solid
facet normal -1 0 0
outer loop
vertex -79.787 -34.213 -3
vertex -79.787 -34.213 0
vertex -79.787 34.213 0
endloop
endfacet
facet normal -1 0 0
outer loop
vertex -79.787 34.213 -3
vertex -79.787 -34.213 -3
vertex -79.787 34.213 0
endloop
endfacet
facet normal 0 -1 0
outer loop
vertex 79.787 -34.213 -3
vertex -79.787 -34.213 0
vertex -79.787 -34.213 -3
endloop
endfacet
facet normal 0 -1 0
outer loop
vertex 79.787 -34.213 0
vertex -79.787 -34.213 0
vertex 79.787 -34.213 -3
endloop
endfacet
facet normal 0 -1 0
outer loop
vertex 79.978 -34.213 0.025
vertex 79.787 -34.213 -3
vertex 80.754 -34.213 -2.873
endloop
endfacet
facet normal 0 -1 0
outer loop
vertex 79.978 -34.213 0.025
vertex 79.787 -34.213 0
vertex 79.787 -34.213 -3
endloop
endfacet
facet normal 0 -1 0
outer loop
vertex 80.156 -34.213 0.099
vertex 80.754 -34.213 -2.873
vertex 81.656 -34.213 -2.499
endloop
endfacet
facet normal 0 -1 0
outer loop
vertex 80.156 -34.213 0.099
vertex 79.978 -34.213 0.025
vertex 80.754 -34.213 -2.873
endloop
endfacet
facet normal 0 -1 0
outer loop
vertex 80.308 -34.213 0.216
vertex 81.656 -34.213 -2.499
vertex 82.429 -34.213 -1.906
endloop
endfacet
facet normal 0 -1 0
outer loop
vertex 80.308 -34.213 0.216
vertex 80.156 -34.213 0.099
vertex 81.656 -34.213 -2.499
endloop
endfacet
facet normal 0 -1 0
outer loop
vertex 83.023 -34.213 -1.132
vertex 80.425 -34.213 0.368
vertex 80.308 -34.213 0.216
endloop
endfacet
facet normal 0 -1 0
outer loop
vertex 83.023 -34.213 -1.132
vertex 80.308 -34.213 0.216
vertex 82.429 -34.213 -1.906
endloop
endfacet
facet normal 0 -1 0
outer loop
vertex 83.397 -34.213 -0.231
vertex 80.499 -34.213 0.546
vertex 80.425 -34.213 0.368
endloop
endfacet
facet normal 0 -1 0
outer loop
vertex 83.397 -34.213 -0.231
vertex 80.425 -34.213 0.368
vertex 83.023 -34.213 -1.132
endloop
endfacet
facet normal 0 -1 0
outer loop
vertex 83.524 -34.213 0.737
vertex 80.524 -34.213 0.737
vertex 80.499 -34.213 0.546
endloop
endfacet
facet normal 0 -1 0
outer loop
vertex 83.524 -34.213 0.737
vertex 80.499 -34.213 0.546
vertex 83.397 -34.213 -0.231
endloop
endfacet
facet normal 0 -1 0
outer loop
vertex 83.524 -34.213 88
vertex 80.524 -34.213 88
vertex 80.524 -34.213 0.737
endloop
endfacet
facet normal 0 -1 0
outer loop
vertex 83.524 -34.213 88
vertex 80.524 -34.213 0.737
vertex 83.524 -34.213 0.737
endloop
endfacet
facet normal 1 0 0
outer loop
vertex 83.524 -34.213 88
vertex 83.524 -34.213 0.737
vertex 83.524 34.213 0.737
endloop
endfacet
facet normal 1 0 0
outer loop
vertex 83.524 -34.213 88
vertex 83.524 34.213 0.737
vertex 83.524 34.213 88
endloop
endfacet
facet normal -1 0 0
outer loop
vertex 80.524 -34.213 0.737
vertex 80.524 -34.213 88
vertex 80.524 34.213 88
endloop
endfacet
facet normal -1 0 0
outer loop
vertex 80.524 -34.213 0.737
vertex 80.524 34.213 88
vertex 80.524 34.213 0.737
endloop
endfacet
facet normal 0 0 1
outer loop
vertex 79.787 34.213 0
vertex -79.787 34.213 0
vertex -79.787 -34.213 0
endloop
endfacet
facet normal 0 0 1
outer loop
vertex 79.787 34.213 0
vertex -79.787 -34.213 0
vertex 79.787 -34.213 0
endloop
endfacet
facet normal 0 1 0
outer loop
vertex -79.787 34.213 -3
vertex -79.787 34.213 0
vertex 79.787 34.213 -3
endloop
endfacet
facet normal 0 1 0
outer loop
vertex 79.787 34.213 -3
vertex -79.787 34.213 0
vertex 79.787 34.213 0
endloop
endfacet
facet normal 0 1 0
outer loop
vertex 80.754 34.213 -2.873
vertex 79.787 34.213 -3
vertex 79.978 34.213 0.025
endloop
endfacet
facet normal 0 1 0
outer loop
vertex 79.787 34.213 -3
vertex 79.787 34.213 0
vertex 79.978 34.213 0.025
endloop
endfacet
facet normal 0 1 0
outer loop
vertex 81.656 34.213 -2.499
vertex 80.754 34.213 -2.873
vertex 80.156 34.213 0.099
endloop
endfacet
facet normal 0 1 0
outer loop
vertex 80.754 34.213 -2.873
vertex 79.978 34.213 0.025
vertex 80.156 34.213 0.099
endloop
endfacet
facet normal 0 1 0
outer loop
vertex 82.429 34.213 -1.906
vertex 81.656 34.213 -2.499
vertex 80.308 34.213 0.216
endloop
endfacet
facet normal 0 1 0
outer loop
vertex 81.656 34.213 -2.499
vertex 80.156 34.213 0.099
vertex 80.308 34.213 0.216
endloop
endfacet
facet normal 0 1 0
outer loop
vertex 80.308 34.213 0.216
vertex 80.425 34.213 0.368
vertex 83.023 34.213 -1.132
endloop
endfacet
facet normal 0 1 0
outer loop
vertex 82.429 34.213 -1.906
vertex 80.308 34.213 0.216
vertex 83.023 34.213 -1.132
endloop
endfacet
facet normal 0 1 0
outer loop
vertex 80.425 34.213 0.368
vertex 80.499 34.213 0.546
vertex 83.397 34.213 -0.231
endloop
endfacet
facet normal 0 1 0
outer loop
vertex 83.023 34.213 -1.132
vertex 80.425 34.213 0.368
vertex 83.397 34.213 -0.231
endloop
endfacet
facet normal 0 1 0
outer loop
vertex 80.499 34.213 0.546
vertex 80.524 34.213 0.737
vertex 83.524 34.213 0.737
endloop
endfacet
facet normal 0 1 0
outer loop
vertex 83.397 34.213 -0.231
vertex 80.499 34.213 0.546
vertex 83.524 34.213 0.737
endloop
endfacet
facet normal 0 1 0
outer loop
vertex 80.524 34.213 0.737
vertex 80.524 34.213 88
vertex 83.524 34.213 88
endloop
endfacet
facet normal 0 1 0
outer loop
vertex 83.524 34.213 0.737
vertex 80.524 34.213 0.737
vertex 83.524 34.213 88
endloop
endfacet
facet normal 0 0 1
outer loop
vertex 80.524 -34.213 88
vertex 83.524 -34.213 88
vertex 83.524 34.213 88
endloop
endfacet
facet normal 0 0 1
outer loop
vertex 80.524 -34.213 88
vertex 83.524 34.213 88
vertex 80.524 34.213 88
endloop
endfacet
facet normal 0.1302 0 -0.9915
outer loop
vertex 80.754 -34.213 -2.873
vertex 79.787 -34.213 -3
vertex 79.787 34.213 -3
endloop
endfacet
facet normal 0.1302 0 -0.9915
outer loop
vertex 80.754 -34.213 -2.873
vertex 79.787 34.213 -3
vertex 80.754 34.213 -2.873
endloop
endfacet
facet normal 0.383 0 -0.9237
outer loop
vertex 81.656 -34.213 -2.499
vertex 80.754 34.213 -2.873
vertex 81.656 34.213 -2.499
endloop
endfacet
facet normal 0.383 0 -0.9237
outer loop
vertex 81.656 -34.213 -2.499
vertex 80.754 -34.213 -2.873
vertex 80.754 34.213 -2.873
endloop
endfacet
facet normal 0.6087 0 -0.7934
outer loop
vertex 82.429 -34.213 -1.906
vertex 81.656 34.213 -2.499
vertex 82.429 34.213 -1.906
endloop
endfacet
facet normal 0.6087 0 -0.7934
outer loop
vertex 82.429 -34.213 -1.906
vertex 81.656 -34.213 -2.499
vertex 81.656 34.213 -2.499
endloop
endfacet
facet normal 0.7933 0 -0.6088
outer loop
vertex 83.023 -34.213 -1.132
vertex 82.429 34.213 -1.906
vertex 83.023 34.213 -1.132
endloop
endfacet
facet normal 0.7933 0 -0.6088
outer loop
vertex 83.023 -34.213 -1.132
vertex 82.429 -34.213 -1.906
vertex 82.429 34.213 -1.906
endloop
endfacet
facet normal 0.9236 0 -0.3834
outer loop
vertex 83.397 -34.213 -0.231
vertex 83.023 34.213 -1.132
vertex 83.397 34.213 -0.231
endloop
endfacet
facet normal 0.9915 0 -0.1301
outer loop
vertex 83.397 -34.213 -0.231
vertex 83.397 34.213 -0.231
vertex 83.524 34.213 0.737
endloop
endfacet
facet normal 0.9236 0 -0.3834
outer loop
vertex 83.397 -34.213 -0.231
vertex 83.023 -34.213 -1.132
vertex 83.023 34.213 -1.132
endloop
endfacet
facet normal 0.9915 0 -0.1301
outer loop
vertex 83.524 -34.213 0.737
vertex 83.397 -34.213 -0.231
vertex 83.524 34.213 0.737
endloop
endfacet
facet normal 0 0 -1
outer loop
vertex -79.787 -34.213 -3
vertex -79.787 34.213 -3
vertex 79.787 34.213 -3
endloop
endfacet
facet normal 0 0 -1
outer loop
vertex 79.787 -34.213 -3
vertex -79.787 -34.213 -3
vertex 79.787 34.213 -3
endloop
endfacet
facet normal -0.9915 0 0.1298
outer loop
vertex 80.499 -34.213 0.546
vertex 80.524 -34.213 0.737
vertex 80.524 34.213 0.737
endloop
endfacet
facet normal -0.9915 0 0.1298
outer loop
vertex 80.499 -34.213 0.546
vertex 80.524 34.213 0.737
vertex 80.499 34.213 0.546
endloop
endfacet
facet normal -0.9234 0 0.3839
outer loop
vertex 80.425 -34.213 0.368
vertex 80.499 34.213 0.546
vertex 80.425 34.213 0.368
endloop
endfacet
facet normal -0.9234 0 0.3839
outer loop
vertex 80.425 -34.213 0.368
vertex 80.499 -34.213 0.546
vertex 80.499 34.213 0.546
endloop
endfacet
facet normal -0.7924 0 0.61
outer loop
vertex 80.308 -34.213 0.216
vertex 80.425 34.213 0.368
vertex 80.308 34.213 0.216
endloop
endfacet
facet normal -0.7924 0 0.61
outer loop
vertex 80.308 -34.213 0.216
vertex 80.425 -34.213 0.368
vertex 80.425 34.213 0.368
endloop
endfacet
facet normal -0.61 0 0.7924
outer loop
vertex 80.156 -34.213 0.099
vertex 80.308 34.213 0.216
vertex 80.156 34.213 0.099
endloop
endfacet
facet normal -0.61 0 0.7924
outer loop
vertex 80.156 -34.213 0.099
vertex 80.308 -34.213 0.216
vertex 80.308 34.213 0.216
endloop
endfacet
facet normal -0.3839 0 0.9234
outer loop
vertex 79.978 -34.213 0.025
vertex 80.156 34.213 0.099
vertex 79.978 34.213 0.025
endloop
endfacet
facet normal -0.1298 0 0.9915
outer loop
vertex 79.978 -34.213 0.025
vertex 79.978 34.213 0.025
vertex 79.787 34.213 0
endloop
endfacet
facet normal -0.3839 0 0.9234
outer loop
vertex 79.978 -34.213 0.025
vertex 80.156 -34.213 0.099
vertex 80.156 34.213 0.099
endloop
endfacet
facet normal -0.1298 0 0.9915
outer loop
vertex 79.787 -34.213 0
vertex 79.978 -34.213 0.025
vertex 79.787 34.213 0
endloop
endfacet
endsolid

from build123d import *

# Parameters (mm, degrees)
SKETCH2_W          = 159.574581504
SKETCH2_H          = 68.426848692
BASE_FLANGE1_DEPTH = 3
EDGE_FLANGE1_DEPTH = 68.426848692


# Sheet-metal steps are written as plain solids
with BuildPart() as part:
    # Sketch2 → Base-Flange1 (new body)
    with BuildSketch(Plane.XY):
        Rectangle(SKETCH2_W, SKETCH2_H)
    extrude(amount=-BASE_FLANGE1_DEPTH)

    # Edge-Flange1 section (across the edge) → Edge-Flange1 (add)
    with BuildSketch(Plane(origin=(80.523890752, -34.213424346, 0), x_dir=(-1, 0, 0), z_dir=(0, 1, 0))):
        with BuildLine():
            Line((-3, 0.7366), (-3, 88))
            Line((-3, 88), (0, 88))
            Line((0, 88), (0, 0.7366))
            ThreePointArc((0, 0.7366), (0.215745145, 0.215745145), (0.7366, 0))
            Line((0.7366, 0), (0.7366, -3))
            ThreePointArc((0.7366, -3), (-1.905575199, -1.905575199), (-3, 0.7366))
        make_face()
    extrude(amount=EDGE_FLANGE1_DEPTH)


solid = part.part
